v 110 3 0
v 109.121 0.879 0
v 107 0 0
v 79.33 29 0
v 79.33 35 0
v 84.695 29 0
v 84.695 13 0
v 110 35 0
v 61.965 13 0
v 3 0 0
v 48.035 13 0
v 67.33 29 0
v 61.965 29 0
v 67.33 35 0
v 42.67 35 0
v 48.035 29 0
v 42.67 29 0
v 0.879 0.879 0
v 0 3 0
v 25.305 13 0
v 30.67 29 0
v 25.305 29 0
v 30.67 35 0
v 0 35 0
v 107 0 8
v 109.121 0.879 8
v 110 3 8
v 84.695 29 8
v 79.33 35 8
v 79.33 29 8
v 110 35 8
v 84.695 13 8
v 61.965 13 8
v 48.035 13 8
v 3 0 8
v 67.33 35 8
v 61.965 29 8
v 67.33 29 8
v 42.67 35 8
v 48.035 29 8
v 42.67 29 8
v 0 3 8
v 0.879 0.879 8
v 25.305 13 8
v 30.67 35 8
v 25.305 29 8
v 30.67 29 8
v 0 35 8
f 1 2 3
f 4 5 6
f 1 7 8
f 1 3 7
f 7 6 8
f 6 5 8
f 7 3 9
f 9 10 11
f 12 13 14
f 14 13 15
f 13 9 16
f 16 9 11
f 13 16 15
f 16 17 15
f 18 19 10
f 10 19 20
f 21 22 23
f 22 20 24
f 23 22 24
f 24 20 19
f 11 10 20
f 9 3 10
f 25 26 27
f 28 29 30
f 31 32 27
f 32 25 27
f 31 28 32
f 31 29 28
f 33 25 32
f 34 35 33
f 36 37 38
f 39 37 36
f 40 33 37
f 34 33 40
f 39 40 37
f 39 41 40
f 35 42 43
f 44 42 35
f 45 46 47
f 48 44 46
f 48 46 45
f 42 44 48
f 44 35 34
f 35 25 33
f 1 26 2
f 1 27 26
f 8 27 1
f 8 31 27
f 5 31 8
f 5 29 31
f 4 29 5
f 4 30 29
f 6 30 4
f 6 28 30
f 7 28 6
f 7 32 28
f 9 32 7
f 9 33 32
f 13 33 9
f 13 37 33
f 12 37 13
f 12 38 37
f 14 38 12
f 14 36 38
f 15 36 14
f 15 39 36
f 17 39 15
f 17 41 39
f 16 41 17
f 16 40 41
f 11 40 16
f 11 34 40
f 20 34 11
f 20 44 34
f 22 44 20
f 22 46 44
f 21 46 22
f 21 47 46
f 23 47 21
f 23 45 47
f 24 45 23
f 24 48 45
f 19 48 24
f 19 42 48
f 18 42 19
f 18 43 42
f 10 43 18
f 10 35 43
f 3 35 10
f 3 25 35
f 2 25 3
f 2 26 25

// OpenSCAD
$fn = 32;

// ----------------------------------------------------------------------
// Window plate: 110 x 35 mm, 2 open windows
// ----------------------------------------------------------------------

// --- parameters (mm) ---
profile_height = 8;       // extrusion height
profile_points = 24;      // points of the closed outline

profile = [[0, 3], [0.879, 0.879], [3, 0], [107, 0], [109.121, 0.879], [110, 3], [110, 35], [79.33, 35], [79.33, 29], [84.695, 29], [84.695, 13], [61.965, 13], [61.965, 29], [67.33, 29], [67.33, 35], [42.67, 35], [42.67, 29], [48.035, 29], [48.035, 13], [25.305, 13], [25.305, 29], [30.67, 29], [30.67, 35], [0, 35]];  // single closed polygon, 24 points, counter clockwise

// --- the one profile operation ---
linear_extrude(height = profile_height) polygon(points = profile);
